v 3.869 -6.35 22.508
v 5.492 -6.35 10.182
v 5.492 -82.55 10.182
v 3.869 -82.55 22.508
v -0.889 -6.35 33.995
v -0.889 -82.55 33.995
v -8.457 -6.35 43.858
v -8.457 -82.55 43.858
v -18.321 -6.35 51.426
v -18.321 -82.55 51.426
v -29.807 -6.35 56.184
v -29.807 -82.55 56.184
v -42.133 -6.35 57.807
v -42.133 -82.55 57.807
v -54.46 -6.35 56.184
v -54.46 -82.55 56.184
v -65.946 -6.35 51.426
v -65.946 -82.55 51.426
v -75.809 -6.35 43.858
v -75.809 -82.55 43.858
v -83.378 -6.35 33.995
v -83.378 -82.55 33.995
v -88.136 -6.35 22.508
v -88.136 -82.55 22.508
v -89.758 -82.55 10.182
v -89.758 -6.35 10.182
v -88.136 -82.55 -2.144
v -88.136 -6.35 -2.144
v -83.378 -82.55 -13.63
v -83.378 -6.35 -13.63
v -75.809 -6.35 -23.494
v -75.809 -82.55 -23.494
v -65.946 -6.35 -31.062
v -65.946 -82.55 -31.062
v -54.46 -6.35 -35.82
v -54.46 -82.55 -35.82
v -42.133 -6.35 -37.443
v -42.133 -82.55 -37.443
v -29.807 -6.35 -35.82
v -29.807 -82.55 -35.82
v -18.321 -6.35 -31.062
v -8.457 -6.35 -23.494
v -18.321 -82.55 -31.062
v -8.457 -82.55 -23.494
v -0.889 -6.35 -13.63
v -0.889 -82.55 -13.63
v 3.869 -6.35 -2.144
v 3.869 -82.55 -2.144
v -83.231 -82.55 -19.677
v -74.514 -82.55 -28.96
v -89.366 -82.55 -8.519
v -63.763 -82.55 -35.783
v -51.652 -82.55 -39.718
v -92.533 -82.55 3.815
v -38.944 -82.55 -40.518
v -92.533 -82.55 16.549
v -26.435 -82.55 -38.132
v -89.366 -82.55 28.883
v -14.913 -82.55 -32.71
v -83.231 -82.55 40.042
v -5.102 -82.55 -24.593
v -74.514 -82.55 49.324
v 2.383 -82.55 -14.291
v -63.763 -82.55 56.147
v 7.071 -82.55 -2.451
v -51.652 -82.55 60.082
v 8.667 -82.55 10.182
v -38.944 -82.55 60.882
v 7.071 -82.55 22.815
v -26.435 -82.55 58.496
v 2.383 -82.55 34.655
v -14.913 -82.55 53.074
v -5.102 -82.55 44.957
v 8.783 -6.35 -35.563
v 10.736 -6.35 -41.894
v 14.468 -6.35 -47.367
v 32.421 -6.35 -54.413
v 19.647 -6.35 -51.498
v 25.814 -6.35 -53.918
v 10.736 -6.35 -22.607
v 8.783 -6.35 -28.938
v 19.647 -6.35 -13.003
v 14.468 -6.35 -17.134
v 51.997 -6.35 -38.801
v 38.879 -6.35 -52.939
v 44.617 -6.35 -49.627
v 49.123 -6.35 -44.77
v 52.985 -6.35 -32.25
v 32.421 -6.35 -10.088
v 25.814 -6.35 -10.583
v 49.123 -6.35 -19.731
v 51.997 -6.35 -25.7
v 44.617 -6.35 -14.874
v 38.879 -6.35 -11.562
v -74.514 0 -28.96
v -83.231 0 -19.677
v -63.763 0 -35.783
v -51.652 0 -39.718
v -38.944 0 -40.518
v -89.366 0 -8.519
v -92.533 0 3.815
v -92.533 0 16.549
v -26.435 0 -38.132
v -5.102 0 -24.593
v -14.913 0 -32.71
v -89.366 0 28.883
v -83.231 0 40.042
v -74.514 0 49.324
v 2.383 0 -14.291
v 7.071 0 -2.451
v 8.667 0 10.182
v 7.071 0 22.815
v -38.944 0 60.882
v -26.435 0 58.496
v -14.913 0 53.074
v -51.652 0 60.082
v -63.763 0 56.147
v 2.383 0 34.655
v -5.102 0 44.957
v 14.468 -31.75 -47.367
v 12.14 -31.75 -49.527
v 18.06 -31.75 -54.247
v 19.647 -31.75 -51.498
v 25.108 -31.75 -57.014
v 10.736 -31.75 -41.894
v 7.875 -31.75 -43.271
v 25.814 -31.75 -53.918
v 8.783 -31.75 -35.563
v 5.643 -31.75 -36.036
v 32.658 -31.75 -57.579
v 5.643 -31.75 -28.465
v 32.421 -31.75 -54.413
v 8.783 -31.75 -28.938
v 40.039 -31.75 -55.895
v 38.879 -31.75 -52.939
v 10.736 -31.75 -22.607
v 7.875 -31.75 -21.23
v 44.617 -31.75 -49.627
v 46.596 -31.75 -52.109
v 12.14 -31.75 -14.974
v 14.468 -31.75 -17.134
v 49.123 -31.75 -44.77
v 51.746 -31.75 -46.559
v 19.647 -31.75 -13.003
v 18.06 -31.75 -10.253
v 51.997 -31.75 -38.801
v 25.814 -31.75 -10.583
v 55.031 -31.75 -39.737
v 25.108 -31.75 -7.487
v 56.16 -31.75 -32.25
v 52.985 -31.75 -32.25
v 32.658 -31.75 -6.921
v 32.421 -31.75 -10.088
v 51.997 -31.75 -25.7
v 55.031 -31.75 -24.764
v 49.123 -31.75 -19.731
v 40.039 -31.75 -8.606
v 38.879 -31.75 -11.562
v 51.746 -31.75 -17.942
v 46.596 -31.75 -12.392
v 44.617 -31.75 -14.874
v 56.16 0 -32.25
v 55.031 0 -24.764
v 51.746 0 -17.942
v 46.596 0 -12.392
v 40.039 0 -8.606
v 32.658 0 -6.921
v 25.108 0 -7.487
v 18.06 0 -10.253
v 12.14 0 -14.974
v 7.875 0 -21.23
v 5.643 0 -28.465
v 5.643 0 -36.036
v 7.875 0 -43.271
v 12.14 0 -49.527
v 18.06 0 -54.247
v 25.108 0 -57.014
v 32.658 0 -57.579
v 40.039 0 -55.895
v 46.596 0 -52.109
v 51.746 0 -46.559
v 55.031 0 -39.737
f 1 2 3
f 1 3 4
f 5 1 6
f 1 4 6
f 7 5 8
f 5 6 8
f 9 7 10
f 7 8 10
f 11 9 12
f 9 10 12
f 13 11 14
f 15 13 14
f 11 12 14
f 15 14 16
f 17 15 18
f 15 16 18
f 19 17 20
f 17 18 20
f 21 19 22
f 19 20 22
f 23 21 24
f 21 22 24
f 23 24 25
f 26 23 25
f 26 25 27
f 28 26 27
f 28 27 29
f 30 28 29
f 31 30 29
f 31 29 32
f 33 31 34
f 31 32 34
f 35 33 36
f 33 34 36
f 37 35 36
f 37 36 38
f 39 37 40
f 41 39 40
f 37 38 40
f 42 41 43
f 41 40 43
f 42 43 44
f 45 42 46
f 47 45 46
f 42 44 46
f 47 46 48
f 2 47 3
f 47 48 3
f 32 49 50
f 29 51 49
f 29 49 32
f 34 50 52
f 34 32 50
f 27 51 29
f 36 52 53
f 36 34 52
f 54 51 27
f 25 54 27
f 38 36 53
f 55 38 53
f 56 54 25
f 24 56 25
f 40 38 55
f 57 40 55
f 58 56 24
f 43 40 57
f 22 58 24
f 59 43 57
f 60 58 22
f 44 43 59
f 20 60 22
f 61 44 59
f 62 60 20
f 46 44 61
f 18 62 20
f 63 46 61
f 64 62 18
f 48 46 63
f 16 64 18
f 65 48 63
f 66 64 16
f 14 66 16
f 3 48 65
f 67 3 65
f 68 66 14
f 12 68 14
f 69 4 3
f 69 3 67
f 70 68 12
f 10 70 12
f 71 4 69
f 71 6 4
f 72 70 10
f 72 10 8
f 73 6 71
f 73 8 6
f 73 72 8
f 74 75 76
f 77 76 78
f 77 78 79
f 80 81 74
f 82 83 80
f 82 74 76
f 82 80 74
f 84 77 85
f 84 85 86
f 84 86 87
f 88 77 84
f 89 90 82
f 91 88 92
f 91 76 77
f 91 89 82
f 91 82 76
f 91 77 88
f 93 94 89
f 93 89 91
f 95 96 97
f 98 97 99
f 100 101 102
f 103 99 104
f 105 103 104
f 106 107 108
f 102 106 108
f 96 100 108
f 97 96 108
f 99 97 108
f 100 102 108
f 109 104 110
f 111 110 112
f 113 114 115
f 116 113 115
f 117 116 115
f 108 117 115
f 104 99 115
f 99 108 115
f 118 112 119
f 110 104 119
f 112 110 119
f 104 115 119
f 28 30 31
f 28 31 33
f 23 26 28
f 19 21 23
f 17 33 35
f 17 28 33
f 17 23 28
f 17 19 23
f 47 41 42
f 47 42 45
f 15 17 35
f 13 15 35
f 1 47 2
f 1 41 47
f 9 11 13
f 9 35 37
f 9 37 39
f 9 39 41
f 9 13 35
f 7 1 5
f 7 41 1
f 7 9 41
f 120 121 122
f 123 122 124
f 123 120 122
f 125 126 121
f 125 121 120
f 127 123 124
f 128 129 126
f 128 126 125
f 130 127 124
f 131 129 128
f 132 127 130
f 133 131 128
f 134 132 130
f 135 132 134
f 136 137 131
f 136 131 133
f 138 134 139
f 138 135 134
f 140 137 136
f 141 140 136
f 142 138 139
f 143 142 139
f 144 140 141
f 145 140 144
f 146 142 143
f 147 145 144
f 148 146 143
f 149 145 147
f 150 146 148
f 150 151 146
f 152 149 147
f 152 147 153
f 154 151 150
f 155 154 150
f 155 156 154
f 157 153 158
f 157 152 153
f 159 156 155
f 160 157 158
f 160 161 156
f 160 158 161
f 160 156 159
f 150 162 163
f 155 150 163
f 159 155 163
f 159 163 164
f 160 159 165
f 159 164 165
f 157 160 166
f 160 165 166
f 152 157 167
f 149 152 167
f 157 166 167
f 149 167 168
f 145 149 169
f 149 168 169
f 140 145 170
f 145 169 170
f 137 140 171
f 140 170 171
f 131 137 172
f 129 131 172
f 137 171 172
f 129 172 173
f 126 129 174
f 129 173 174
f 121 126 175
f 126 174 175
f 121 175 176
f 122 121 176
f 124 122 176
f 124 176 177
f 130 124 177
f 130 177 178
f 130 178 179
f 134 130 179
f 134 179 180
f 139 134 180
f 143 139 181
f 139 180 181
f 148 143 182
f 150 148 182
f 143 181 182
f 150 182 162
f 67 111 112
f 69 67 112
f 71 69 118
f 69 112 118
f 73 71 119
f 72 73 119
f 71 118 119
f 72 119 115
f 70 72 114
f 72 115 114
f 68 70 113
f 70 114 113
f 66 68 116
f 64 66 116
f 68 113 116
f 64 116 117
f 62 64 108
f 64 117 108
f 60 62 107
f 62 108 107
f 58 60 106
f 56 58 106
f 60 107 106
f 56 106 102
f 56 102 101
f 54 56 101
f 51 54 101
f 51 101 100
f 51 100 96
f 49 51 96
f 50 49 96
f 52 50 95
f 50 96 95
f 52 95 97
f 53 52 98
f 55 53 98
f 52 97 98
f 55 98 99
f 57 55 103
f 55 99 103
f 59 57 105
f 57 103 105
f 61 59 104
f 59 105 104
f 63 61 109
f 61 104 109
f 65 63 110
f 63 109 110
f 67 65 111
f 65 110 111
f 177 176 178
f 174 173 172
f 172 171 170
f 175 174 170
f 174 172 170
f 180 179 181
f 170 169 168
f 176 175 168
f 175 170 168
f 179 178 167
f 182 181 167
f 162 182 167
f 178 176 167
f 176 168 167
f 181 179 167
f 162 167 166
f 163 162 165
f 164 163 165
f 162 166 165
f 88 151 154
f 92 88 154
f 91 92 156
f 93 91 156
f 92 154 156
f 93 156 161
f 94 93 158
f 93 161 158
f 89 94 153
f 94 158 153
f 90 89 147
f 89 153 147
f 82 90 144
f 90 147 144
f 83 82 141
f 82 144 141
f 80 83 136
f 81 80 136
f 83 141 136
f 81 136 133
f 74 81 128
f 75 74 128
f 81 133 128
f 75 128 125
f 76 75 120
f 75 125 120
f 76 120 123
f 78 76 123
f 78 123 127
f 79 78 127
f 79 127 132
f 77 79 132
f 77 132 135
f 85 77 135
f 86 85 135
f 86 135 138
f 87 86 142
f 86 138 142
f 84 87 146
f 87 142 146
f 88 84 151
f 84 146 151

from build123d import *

# Parameters (mm, degrees)
F0_R     = 50.8
F2_DEPTH = 82.55
F1_R     = 25.4
F3_DEPTH = 31.75
F4_R     = 47.625
F5_DEPTH = 76.2
F6_R     = 22.225
F7_DEPTH = 25.4


with BuildPart() as f2:
    # F0 (on Front) → F2 (new body)
    with BuildSketch(Plane.XZ):
        with Locations((-42.133313, 10.182019)):
            Circle(F0_R)
    extrude(amount=F2_DEPTH)

    # F4 (on face) → F5 (cut)
    with BuildSketch(Plane.XZ.offset(82.55)):
        with Locations((-42.133313, 10.182019)):
            Circle(F4_R)
    extrude(amount=-F5_DEPTH, mode=Mode.SUBTRACT)


with BuildPart() as f3:
    # F1 (on Front) → F3 (new body)
    with BuildSketch(Plane.XZ):
        with Locations((30.759756, -32.250449)):
            Circle(F1_R)
    extrude(amount=F3_DEPTH)

    # F6 (on face) → F7 (cut)
    with BuildSketch(Plane.XZ.offset(31.75)):
        with Locations((30.759756, -32.250449)):
            Circle(F6_R)
    extrude(amount=-F7_DEPTH, mode=Mode.SUBTRACT)


solid = Compound([f2.part, f3.part])
